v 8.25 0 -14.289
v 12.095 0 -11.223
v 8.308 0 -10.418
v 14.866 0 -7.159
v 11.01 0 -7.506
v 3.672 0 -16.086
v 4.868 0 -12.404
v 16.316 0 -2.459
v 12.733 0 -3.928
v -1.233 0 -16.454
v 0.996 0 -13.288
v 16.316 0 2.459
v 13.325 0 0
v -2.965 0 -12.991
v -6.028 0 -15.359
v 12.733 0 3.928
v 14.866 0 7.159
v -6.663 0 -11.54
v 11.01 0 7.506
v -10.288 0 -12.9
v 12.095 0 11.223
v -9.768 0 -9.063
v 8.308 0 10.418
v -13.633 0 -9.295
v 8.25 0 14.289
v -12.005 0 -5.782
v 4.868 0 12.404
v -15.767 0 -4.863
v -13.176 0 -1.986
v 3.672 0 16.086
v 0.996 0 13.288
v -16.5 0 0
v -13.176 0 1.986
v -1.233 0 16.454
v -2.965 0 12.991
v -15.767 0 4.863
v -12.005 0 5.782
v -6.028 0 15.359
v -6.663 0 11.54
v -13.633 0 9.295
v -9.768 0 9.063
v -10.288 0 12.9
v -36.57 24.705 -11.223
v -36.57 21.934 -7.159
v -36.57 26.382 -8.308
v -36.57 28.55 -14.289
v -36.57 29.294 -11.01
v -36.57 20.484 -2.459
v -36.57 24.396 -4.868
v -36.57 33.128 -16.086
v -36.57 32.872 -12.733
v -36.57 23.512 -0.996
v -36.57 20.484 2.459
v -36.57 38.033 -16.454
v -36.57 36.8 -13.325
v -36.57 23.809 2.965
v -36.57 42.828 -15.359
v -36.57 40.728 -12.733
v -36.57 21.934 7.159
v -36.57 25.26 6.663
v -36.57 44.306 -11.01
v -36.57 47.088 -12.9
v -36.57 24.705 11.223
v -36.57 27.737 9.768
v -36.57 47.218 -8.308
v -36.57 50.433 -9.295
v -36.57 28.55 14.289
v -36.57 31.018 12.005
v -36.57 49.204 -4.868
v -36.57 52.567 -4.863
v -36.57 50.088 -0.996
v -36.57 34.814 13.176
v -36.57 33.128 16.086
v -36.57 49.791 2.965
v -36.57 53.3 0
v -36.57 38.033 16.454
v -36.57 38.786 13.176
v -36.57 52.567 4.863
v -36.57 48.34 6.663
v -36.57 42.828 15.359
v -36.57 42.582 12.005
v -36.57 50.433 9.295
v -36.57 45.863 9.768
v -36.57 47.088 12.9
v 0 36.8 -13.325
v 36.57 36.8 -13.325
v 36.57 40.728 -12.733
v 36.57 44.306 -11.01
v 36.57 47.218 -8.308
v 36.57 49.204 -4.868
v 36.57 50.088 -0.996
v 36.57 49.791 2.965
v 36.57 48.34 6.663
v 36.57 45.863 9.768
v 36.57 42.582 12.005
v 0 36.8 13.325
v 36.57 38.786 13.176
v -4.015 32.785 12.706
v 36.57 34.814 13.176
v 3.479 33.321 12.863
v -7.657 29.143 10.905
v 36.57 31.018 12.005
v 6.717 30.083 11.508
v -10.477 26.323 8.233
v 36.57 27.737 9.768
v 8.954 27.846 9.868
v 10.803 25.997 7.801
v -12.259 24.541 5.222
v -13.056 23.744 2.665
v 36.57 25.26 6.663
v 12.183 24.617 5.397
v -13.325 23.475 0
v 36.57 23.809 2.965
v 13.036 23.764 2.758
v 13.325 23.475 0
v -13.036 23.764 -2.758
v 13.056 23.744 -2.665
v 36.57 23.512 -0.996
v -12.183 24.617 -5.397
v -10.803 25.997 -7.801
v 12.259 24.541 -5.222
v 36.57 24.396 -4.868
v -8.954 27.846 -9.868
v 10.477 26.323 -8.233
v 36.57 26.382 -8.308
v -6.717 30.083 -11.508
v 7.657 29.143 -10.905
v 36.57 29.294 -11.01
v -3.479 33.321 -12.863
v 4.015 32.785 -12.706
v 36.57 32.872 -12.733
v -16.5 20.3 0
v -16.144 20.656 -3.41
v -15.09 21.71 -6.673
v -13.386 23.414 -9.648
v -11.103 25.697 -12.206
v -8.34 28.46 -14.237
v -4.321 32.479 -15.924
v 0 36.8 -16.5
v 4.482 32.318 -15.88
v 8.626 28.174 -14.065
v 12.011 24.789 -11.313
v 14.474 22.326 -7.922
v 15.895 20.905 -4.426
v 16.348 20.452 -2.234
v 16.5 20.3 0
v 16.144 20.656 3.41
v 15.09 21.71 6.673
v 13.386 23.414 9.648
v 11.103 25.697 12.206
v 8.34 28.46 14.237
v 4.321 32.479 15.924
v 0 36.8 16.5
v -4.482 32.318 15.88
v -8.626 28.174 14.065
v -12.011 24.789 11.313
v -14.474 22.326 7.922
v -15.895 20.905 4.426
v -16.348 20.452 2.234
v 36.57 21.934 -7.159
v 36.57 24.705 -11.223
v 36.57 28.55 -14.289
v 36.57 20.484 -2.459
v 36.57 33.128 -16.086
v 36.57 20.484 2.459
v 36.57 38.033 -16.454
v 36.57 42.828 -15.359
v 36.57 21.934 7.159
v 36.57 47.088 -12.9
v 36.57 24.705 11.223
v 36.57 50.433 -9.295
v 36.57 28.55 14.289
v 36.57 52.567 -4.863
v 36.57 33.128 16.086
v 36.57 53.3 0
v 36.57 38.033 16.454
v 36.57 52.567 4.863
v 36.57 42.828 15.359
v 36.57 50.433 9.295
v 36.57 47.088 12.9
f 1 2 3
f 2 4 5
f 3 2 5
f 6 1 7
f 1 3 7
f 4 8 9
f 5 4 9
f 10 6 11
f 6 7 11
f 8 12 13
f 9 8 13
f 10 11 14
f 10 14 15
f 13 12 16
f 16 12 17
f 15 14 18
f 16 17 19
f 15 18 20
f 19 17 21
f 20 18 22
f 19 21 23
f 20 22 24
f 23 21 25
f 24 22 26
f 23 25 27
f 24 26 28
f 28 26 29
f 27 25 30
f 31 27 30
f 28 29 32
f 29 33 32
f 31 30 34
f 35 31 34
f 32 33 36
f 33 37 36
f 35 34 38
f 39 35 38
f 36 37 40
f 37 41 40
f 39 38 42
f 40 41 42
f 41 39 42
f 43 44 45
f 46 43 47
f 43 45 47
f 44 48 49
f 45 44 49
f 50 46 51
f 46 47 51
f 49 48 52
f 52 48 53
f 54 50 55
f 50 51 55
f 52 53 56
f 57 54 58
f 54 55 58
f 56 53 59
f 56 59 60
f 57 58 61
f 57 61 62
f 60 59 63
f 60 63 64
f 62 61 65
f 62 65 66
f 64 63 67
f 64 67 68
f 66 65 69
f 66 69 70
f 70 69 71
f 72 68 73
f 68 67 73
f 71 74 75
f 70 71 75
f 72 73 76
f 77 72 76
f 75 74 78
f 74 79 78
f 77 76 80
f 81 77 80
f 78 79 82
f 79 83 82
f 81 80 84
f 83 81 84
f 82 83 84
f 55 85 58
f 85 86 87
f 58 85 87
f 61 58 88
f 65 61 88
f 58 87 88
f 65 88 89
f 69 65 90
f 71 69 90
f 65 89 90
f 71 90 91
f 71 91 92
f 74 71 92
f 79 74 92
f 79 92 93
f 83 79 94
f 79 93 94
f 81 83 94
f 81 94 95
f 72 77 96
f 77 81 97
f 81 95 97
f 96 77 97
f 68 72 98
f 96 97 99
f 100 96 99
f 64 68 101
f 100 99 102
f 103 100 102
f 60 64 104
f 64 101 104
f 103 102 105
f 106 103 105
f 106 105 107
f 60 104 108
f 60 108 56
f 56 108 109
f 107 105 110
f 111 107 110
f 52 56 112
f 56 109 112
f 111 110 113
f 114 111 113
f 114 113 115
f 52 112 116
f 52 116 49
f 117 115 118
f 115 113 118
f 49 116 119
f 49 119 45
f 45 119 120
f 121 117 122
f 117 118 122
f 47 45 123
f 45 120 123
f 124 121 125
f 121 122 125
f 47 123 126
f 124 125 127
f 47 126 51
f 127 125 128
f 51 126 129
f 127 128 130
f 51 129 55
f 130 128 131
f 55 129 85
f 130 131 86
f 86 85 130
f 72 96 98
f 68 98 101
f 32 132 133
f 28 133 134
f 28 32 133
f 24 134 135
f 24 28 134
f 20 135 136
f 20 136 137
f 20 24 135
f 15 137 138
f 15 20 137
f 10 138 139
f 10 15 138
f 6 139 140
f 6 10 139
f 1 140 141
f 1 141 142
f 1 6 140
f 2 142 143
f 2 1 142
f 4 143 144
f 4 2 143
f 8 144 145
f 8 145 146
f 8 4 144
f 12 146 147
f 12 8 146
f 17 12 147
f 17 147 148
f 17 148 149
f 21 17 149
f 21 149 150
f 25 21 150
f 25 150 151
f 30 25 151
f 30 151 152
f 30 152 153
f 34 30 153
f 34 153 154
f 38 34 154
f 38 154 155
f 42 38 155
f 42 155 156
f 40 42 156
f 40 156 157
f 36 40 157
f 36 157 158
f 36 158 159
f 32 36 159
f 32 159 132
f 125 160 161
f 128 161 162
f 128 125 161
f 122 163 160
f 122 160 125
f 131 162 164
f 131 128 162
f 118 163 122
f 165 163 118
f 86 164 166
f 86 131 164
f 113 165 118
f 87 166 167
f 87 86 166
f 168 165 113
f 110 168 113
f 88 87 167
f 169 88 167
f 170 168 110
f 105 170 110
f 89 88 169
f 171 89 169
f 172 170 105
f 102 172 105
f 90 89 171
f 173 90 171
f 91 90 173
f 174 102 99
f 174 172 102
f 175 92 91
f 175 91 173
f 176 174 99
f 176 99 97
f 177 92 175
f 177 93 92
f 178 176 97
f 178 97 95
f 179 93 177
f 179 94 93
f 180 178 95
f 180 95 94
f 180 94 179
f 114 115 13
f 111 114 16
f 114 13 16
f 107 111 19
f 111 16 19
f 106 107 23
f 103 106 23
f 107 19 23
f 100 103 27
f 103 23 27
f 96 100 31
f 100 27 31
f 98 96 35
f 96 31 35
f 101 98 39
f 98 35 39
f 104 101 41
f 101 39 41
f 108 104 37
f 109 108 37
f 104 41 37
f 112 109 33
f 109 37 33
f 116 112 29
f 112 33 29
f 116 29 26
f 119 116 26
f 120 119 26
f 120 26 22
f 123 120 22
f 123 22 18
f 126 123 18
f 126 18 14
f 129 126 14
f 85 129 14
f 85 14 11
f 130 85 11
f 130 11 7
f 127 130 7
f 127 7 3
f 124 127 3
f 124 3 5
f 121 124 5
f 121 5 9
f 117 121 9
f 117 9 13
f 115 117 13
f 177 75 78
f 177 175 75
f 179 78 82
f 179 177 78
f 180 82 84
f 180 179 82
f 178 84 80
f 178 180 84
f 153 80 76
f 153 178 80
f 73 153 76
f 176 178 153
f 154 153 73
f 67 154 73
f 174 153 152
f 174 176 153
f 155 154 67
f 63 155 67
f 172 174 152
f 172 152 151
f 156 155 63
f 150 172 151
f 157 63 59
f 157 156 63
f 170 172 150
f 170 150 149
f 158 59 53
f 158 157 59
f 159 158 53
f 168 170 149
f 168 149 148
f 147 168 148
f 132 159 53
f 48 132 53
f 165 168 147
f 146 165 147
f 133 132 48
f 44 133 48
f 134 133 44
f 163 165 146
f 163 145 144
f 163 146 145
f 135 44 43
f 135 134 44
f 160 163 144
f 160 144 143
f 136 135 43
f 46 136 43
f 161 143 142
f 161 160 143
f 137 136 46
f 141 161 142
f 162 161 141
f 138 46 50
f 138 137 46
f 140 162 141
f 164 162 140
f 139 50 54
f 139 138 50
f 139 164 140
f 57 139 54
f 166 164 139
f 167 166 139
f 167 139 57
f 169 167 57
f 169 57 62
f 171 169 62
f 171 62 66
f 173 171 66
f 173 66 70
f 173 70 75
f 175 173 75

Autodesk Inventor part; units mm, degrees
ref_plane "YZ Plane" through (0, 0, 0) normal (1, 0, 0) x (0, 1, 0)
ref_plane "XZ Plane" through (0, 0, 0) normal (0, 1, 0) x (-1, 0, 0)
ref_plane "XY Plane" through (0, 0, 0) normal (0, 0, 1) x (1, 0, 0)
sketch "Boceto2" plane through (0, 0, 0) normal (0, 1, 0) x (-1, 0, 0)
  circle A0 centre (0, 0) radius 16.5
  dimension "d0" = 33
extrude "Extrusión1" add sketch "Boceto2" along normal blind 36.8
sketch "Boceto3" plane through (0, 0, 0) normal (1, 0, 0) x (0, 1, 0)
  line L0 (0, 0) -> (36.8, 0)
  line L1 (36.8, -16.5) -> (36.8, 16.5) projected
  circle A0 centre (36.8, 0) radius 16.5
extrude "Extrusión2" add sketch "Boceto3" along normal mid plane 73.14
sketch "Boceto4" plane through (36.57, 36.8, 0) normal (1, 0, 0) x (0, 0, -1)
  circle A0 centre (0, 0) radius 13.325
  point P0 (0, -36.8)
  dimension "d5" = 26.65
extrude "Extrusión3" cut sketch "Boceto4" against normal blind 73.14
sketch "Boceto5" plane through (0, 0, 0) normal (0, -1, 0) x (1, 0, 0)
  circle A0 centre (0, 0) radius 13.325
  dimension "d8" = 26.65
extrude "Extrusión4" cut sketch "Boceto5" against normal up to surface
properties part number "T" material "PVC, no plastificado"
